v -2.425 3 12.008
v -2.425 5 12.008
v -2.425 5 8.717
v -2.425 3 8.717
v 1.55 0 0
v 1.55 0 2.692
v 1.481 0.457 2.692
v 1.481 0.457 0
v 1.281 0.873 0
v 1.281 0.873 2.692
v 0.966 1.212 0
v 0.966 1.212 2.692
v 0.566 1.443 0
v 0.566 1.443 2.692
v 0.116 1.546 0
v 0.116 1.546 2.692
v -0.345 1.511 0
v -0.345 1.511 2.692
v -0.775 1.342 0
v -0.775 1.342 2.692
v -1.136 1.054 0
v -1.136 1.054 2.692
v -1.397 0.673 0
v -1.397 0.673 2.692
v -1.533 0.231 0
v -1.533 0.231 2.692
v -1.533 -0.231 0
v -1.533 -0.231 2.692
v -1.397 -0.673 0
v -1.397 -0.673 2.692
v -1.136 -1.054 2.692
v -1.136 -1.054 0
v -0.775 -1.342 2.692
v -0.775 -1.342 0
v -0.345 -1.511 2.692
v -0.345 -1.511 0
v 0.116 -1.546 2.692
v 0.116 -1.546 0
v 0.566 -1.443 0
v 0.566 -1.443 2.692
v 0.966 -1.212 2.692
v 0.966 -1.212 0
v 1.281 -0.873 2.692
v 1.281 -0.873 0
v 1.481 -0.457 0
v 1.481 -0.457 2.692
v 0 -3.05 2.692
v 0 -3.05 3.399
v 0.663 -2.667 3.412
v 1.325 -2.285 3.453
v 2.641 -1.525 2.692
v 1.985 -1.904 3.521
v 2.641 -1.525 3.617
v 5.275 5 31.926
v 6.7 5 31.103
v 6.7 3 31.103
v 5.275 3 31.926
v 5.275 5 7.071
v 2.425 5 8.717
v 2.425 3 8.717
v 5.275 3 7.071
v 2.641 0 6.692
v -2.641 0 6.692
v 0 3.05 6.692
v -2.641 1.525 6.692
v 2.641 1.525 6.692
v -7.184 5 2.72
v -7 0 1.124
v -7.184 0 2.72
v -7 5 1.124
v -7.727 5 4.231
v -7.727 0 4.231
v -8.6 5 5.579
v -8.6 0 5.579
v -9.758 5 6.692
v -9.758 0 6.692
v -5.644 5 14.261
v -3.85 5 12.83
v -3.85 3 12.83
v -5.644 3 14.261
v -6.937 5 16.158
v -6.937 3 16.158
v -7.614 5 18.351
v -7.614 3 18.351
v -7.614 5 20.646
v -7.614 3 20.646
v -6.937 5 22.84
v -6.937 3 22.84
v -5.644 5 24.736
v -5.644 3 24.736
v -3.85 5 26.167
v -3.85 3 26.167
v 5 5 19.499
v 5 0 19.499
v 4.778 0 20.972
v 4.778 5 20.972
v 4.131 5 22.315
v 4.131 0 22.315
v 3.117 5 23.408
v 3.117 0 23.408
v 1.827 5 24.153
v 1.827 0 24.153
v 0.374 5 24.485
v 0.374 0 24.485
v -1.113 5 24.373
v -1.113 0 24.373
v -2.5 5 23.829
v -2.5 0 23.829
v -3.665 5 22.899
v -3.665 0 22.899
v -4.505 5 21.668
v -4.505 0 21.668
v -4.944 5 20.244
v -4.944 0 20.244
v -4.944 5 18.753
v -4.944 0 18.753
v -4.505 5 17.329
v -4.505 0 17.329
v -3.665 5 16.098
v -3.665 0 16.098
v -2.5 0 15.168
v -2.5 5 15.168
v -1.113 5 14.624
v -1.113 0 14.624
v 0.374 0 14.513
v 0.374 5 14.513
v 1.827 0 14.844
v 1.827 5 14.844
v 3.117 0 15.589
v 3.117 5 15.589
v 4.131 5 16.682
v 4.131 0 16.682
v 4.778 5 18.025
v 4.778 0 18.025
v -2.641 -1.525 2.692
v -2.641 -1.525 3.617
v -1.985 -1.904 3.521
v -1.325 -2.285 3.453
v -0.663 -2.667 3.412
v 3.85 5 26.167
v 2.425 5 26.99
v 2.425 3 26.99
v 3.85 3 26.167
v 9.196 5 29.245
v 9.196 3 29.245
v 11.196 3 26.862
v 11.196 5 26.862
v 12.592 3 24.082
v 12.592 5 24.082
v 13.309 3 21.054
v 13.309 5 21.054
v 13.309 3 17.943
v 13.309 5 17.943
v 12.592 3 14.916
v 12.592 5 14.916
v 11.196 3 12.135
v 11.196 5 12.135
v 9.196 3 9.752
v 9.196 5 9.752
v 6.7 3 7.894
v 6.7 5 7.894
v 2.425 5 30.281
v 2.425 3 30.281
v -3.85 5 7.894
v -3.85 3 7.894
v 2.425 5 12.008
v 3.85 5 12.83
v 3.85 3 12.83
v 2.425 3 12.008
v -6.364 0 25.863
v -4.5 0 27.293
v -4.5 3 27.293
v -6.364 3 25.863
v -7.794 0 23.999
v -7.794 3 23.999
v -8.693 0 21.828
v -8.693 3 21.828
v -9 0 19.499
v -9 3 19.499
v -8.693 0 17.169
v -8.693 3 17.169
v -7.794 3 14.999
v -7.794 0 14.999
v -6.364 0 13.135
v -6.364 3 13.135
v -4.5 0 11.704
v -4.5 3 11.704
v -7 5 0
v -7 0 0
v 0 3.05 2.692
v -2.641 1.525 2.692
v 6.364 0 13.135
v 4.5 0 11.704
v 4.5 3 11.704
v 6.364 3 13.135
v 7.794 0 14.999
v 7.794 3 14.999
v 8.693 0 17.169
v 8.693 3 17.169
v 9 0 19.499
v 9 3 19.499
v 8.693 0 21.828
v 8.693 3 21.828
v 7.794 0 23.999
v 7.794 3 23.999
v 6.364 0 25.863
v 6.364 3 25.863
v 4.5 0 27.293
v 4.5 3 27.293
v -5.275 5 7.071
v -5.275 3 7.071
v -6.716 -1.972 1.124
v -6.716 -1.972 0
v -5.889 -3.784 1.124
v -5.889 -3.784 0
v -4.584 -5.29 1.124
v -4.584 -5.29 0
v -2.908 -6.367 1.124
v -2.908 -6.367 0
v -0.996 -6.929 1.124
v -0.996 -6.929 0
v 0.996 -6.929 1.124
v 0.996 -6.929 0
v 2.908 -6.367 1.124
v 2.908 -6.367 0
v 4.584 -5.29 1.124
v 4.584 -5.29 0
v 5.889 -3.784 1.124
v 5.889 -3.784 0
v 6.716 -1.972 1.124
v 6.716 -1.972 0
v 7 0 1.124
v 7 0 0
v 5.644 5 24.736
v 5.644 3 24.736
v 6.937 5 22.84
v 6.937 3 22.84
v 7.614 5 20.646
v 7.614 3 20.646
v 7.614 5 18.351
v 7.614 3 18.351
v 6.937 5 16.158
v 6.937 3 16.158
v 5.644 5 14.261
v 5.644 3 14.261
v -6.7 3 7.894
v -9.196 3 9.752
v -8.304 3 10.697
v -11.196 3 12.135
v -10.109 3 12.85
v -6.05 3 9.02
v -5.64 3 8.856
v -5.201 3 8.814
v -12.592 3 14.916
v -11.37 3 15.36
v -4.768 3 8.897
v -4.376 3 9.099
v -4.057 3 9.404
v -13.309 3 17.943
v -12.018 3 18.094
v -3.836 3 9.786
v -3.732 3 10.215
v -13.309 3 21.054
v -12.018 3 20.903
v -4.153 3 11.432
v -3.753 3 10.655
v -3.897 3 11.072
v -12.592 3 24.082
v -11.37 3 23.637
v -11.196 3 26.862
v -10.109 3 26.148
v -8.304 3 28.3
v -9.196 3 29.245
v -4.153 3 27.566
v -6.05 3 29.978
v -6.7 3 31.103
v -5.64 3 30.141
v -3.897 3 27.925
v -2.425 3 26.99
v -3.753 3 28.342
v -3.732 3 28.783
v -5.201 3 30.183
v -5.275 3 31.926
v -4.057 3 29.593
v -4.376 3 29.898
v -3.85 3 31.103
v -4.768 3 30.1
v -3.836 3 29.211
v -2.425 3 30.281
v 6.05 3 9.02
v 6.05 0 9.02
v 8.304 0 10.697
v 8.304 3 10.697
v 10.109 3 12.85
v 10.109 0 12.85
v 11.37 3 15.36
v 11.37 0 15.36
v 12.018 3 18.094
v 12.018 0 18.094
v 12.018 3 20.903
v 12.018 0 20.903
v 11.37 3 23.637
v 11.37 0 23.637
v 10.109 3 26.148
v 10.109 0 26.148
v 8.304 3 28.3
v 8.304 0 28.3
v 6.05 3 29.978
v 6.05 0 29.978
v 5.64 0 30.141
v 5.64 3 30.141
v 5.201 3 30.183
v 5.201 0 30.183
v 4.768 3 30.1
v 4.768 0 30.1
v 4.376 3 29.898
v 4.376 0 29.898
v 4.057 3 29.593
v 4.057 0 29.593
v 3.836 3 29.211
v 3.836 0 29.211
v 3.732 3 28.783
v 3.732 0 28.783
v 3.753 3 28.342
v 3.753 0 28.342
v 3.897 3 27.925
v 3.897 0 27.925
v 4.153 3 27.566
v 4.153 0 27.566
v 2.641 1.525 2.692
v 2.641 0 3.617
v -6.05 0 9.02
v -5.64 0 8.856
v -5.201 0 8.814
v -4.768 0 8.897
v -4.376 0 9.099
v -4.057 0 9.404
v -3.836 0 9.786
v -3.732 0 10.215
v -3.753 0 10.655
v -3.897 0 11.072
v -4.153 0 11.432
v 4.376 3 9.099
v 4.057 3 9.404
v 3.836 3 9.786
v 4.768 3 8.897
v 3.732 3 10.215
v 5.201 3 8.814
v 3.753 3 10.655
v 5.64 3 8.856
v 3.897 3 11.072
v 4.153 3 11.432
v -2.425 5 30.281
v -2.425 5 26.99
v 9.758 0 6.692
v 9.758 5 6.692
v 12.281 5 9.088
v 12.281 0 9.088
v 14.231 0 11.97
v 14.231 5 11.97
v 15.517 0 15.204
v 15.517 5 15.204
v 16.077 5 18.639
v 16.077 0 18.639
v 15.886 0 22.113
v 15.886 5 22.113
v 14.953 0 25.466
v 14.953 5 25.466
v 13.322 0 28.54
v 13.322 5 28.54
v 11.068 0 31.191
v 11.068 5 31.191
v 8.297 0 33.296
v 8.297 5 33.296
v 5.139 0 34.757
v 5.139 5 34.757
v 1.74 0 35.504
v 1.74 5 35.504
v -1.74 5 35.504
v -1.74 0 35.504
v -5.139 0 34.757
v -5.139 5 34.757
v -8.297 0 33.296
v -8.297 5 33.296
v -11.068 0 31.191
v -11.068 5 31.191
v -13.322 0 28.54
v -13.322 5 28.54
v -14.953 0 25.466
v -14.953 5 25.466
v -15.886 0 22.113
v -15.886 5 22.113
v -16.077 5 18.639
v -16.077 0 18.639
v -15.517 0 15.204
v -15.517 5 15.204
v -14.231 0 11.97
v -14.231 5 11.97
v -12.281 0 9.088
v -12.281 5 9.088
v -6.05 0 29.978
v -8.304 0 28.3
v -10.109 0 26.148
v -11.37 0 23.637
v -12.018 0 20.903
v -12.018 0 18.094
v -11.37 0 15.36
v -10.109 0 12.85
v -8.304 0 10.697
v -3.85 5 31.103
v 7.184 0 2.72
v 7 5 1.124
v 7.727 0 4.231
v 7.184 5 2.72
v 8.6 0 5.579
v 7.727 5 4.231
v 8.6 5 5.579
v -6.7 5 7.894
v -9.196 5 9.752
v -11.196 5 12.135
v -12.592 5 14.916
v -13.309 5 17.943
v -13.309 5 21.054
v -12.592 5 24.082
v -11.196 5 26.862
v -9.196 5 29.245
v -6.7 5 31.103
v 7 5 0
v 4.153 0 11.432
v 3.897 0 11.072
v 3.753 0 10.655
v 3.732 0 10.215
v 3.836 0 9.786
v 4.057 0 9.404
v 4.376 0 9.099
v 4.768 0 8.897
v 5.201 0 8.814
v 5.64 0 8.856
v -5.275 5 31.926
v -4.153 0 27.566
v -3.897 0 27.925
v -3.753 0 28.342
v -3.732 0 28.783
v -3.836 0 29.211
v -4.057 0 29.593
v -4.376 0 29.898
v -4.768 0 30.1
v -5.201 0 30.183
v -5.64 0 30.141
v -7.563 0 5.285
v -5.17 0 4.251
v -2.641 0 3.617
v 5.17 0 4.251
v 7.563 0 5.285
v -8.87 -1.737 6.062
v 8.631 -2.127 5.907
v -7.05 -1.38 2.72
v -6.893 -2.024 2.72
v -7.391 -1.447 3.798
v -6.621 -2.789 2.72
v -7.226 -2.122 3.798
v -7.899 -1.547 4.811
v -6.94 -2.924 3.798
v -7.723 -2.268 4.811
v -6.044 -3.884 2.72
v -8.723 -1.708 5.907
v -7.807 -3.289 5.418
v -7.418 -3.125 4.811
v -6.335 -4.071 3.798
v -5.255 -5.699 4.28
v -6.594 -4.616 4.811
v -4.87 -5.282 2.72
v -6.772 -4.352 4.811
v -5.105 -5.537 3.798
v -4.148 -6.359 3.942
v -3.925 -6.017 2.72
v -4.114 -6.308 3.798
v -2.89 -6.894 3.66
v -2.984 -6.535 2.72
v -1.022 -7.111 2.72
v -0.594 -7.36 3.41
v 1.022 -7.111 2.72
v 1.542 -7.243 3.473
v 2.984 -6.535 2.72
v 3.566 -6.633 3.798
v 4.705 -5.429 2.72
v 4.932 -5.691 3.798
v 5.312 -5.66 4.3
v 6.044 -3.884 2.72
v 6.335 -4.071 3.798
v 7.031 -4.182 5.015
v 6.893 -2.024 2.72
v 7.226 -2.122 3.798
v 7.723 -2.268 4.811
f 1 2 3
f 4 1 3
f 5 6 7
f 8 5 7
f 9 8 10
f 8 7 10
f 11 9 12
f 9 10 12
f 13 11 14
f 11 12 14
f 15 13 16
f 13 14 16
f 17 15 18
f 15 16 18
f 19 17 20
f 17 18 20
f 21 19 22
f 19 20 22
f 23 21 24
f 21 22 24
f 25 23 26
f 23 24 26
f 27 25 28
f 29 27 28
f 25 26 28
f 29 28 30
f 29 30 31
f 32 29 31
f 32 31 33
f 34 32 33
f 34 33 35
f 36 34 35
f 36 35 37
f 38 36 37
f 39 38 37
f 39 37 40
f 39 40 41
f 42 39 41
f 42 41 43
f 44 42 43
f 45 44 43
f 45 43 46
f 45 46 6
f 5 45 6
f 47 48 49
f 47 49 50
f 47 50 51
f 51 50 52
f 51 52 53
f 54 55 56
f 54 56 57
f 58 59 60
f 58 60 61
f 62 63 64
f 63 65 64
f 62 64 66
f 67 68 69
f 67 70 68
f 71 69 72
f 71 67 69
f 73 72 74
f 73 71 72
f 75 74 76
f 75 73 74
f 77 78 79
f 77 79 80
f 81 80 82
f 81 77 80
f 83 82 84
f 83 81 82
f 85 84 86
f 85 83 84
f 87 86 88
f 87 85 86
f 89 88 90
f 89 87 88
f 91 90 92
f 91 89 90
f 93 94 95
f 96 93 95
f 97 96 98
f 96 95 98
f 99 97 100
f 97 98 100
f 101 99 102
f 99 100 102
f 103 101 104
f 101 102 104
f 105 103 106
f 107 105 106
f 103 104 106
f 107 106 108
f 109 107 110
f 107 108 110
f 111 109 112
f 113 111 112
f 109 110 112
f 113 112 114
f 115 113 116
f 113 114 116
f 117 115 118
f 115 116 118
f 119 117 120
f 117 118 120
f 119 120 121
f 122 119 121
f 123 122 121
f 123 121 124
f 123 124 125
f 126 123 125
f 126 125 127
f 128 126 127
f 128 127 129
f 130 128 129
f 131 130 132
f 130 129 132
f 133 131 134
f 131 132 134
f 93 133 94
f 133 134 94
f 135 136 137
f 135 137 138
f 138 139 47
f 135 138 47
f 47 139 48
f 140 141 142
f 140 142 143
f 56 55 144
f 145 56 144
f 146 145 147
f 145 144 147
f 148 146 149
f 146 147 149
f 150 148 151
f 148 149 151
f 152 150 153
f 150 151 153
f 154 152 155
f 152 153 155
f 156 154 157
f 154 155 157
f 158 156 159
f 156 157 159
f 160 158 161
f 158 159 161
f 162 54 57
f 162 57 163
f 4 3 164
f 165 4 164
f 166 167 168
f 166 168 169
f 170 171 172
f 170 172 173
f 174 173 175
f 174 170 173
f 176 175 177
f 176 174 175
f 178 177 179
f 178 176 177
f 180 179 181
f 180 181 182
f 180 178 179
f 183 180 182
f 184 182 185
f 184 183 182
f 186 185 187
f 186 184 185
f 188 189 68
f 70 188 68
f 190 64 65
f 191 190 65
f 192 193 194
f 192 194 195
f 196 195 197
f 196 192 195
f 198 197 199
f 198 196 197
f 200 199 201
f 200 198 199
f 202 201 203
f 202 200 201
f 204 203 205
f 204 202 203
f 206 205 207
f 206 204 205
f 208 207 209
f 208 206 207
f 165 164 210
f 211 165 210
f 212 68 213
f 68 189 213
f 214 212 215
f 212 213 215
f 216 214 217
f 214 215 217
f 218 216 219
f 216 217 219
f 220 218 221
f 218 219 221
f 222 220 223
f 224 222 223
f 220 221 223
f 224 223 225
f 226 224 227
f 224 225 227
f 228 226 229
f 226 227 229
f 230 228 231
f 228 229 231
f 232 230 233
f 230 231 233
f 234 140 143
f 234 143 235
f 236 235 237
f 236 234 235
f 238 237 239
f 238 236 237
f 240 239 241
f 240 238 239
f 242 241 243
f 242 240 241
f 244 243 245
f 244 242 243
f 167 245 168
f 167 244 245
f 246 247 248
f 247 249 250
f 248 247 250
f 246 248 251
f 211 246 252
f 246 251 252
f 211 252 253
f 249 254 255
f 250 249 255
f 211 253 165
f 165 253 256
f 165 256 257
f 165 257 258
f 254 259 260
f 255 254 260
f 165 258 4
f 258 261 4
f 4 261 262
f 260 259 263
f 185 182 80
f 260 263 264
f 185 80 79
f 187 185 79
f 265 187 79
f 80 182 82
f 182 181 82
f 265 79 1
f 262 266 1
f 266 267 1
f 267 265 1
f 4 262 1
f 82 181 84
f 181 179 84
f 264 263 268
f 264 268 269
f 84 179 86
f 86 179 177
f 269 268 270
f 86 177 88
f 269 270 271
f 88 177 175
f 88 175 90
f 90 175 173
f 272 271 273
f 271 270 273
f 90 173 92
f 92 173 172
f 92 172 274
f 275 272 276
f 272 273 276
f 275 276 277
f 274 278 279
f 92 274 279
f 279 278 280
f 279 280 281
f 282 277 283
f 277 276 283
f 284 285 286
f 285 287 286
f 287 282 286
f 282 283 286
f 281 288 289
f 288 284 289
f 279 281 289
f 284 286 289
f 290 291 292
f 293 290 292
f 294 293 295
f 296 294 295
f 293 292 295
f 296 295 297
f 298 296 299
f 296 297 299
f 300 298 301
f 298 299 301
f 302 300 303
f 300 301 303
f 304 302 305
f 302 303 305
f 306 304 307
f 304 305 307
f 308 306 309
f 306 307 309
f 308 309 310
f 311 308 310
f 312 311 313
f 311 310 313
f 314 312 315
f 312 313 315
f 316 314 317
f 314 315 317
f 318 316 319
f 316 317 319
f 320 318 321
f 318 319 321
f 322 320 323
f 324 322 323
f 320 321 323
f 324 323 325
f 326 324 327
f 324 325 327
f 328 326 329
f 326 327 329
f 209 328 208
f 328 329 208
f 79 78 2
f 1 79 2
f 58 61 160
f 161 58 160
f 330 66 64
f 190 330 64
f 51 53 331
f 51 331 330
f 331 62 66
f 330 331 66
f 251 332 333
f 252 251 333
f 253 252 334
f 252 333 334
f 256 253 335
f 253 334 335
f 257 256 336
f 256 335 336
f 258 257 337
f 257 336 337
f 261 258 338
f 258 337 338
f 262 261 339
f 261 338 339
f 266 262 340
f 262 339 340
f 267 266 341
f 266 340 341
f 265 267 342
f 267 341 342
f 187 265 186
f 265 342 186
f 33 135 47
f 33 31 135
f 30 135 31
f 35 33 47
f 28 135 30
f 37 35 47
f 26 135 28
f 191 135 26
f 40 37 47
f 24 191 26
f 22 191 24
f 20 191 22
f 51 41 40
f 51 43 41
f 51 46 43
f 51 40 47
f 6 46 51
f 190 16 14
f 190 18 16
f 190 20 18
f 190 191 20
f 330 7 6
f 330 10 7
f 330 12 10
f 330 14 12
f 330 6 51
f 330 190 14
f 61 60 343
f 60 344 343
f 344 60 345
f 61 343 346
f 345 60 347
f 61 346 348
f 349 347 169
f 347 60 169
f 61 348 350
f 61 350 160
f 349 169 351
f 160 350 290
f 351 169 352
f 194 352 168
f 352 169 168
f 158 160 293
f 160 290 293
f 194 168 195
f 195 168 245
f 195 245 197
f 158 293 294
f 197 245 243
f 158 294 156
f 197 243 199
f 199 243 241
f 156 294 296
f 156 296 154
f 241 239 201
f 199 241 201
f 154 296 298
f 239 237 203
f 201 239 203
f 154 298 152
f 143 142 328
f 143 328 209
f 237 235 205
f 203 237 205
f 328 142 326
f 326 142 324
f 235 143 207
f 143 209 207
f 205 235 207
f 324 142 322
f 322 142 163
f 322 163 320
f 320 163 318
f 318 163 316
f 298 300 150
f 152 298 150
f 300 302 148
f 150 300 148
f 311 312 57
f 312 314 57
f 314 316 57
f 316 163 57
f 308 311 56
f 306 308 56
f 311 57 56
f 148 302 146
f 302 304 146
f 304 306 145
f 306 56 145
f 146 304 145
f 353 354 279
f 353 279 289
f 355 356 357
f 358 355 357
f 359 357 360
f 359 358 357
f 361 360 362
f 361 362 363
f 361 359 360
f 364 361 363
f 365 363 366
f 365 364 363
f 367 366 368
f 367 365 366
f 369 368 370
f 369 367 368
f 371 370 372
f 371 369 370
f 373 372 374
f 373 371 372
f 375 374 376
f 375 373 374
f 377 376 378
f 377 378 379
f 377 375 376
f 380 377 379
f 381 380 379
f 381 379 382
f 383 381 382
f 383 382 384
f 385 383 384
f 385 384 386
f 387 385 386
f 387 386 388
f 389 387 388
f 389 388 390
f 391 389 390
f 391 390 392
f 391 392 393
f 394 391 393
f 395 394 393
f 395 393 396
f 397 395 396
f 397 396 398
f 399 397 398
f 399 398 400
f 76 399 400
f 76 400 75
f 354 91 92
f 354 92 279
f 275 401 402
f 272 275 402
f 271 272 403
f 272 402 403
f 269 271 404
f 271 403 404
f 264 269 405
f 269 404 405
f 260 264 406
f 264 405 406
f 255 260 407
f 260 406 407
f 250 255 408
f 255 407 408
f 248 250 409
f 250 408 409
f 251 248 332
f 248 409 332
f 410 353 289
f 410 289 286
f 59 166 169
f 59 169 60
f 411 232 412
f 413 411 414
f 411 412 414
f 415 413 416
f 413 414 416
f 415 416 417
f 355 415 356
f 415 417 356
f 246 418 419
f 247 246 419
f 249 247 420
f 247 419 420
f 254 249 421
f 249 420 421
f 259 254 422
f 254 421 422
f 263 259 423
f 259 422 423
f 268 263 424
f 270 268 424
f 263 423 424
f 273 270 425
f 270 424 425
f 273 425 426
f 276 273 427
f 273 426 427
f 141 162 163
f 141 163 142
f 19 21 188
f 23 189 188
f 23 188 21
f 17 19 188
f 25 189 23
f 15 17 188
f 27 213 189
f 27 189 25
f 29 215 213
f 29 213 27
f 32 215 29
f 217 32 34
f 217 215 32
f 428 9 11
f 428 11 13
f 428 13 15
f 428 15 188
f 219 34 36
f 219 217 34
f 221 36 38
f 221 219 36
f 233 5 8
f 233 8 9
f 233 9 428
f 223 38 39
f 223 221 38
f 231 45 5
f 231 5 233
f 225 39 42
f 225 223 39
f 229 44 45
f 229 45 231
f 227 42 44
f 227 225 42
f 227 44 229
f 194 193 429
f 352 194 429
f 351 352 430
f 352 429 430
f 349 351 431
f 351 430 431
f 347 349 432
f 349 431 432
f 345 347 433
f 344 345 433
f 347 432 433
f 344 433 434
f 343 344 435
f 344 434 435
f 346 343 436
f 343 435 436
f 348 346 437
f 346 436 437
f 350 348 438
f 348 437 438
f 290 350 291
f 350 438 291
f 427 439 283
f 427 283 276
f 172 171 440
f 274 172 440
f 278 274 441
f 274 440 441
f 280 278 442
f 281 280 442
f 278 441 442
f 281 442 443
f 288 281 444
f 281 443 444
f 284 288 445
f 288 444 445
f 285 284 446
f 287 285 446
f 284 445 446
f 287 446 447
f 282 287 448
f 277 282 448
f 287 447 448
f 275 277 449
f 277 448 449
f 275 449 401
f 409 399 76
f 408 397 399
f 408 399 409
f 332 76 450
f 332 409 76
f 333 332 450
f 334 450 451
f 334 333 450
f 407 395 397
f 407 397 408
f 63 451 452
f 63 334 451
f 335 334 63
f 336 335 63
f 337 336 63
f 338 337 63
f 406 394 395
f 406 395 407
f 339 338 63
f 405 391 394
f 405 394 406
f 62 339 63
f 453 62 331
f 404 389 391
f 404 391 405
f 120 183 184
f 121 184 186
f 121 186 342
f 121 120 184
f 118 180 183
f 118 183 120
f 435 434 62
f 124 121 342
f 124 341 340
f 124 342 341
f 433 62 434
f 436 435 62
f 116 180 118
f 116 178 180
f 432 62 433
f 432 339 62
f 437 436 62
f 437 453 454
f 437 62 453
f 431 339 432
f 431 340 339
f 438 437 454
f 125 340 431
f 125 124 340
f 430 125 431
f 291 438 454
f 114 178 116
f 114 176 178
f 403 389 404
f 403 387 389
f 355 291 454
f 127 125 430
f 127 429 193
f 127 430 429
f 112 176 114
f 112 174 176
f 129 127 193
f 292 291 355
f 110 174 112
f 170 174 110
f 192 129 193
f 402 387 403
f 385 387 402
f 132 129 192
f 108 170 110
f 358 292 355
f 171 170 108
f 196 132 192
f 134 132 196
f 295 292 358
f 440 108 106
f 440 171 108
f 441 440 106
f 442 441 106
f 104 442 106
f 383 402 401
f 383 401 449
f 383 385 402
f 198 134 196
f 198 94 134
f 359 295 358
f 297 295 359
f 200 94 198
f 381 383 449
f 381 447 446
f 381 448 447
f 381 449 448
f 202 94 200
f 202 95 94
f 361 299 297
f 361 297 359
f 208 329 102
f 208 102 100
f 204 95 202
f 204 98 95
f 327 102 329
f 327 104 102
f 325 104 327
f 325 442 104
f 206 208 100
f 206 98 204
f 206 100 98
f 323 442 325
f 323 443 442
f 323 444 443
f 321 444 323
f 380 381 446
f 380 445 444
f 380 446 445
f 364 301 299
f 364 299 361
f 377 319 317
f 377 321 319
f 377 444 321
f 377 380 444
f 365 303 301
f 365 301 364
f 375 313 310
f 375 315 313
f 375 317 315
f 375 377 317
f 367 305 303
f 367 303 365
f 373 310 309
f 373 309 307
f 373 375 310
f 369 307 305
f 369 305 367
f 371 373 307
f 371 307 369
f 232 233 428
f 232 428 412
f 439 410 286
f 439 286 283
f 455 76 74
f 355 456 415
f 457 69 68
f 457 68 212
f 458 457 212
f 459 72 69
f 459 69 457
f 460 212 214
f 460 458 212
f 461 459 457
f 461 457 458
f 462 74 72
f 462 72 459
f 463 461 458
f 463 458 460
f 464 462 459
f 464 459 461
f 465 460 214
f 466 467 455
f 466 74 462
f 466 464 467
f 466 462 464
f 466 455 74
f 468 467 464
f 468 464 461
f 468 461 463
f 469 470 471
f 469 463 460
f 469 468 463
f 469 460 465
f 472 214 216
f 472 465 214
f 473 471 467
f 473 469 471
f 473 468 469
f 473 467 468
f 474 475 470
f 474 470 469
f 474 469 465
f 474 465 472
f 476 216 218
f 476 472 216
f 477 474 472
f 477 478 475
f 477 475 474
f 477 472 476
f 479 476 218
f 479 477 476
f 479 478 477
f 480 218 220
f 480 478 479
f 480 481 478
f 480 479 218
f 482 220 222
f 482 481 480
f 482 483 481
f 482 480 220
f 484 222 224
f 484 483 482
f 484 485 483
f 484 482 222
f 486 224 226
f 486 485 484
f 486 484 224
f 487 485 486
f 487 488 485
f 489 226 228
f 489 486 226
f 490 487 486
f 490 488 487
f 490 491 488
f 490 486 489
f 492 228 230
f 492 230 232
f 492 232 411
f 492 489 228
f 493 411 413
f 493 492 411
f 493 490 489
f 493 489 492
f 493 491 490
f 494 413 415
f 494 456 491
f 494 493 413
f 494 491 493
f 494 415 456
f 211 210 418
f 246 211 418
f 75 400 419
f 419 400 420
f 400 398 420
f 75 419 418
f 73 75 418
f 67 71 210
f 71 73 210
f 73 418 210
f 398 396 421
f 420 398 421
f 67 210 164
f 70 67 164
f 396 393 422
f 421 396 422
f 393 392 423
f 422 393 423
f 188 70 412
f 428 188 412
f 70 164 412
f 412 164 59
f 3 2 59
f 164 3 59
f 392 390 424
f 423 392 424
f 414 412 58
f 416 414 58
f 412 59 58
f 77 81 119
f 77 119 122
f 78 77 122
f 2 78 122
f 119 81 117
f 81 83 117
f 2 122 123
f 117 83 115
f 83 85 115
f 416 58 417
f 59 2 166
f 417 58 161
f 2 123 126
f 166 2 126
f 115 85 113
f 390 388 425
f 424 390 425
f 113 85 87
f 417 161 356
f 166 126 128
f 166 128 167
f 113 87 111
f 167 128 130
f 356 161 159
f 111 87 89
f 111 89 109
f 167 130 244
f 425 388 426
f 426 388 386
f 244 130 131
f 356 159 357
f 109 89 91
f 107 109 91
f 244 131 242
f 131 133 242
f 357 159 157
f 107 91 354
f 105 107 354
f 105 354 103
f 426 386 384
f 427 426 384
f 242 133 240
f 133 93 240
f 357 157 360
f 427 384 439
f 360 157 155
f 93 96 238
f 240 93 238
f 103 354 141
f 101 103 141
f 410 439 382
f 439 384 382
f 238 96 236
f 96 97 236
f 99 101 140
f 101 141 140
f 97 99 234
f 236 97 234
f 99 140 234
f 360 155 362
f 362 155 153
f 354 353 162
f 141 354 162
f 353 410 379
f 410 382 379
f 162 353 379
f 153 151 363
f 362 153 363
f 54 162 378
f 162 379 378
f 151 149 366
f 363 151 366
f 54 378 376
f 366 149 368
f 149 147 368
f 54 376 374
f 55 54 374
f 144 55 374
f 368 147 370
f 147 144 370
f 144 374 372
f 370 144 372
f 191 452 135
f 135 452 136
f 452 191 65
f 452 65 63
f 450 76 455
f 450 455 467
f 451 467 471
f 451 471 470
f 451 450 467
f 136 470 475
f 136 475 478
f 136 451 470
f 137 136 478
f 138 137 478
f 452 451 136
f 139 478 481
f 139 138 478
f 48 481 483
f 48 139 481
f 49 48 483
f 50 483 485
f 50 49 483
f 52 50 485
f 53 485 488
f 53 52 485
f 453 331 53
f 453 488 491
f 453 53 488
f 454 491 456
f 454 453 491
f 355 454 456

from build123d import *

# Parameters (mm, degrees)
SKETCH001_AS_DRAWN_R                 = 5
EXTRUDE001_DEPTH                     = 5
EXTRUDE001_ONTO_SKETCH001_ROLL_ANGLE = 90
FILLET_R                             = 7
POCKET_DEPTH                         = 2
REVOLVE_ANGLE                        = 180
REVOLVE_ONTO_SKETCH003_ROLL_ANGLE    = 90
POCKET001_DEPTH                      = 4
SKETCH005_R                          = 1.55
POCKET002_DEPTH                      = 2.693383
POCKET003_DEPTH                      = 9.758576


with BuildPart() as pocket:
    # Sketch001 as drawn → Extrude001 (new)
    with BuildSketch(Plane.XY):
        with BuildLine():
            Line((-7, 0), (7, 0))
            Line((7, 0), (7, 5))
            ThreePointArc((7, 5), (0, 35.598621), (-7, 5))
            Line((-7, 0), (-7, 5))
        make_face()
        with Locations((0, 19.498621)):
            Circle(SKETCH001_AS_DRAWN_R, mode=Mode.SUBTRACT)
        with BuildLine():
            ThreePointArc((-6.05, 29.977528), (-12.1, 19.498621), (-6.05, 9.019713))
            ThreePointArc((-6.05, 9.019713), (-3.932661, 9.587053), (-4.5, 11.704392))
            ThreePointArc((-4.5, 27.292849), (-9, 19.498621), (-4.5, 11.704392))
            ThreePointArc((-4.5, 27.292849), (-3.932661, 29.410189), (-6.05, 29.977528))
        make_face(mode=Mode.SUBTRACT)
        with BuildLine():
            ThreePointArc((4.5, 11.704392), (9, 19.498621), (4.5, 27.292849))
            ThreePointArc((6.05, 29.977528), (3.932661, 29.410189), (4.5, 27.292849))
            ThreePointArc((6.05, 9.019713), (12.1, 19.498621), (6.05, 29.977528))
            ThreePointArc((4.5, 11.704392), (3.932661, 9.587053), (6.05, 9.019713))
        make_face(mode=Mode.SUBTRACT)
    extrude(amount=-EXTRUDE001_DEPTH)


with BuildPart() as pocket_1:
    # Extrude001 onto Sketch001 roll: moved
    add(pocket.part.rotate(Axis((0, 0, 0), (1, 0, 0)), EXTRUDE001_ONTO_SKETCH001_ROLL_ANGLE))


with BuildPart() as pocket_2:
    # Extrude001 onto Sketch001 placement: moved
    add(pocket_1.part)

    # Fillet
    fillet_edges = [pocket_2.edges().sort_by_distance(p)[0] for p in [
        (7, 2.5, 5),
        (-7, 2.5, 5),
    ]]
    fillet(fillet_edges, radius=FILLET_R)

    # Sketch002 → Pocket (cut)
    with BuildSketch(Plane(origin=(0, 5, 0), x_dir=(-1, 0, 0), z_dir=(0, 1, 0))):
        with BuildLine():
            ThreePointArc((-3.85, 26.167016), (-7.7, 19.498621), (-3.85, 12.830225))
            Line((-3.85, 12.830225), (-2.425, 12.007501))
            Line((-2.425, 12.007501), (-2.425, 10.362053))
            Line((-2.425, 10.362053), (-2.425, 8.716604))
            Line((-2.425, 8.716604), (-3.85, 7.89388))
            Line((-3.85, 7.89388), (-5.275, 7.071156))
            Line((-5.275, 7.071156), (-6.7, 7.89388))
            ThreePointArc((-6.7, 31.103361), (-13.4, 19.498621), (-6.7, 7.89388))
            Line((-6.7, 31.103361), (-5.275, 31.926085))
            Line((-5.275, 31.926085), (-3.85, 31.103361))
            Line((-3.85, 31.103361), (-2.425, 30.280637))
            Line((-2.425, 30.280637), (-2.425, 28.635189))
            Line((-2.425, 28.635189), (-2.425, 26.98974))
            Line((-2.425, 26.98974), (-3.85, 26.167016))
        make_face()
        with BuildLine():
            ThreePointArc((3.85, 12.830225), (7.7, 19.498621), (3.85, 26.167016))
            Line((3.85, 26.167016), (2.424998, 26.989738))
            Line((2.424998, 26.989738), (2.425, 28.635187))
            Line((2.425, 28.635187), (2.425002, 30.280636))
            Line((2.425002, 30.280636), (3.850002, 31.103362))
            Line((3.850002, 31.103362), (5.275001, 31.926088))
            Line((5.275001, 31.926088), (6.7, 31.103361))
            ThreePointArc((6.7, 7.89388), (13.4, 19.498621), (6.7, 31.103361))
            Line((5.275, 7.071157), (6.7, 7.89388))
            Line((3.85, 7.89388), (5.275, 7.071157))
            Line((2.425, 8.716604), (3.85, 7.89388))
            Line((2.425, 10.362052), (2.425, 8.716604))
            Line((2.425, 12.0075), (2.425, 10.362052))
            Line((3.85, 12.830225), (2.425, 12.0075))
        make_face()
    extrude(amount=-POCKET_DEPTH, mode=Mode.SUBTRACT)


with BuildPart() as pocket003:
    # Sketch003 as drawn → Revolve (revolve)
    with BuildSketch(Plane.XY):
        with BuildLine():
            ThreePointArc((-7, 1.124454), (-7.727163, 4.231143), (-9.757576, 6.692383))
            Line((0, 6.692383), (-9.757576, 6.692383))
            Line((0, 0), (0, 6.692383))
            Line((-7, 0), (0, 0))
            Line((-7, 1.124454), (-7, 0))
        make_face()
    revolve(axis=Axis((0, 0, 0), (0, 1, 0)), revolution_arc=REVOLVE_ANGLE)


with BuildPart() as pocket003_1:
    # Revolve onto Sketch003 roll: moved
    add(pocket003.part.rotate(Axis((0, 0, 0), (1, 0, 0)), REVOLVE_ONTO_SKETCH003_ROLL_ANGLE))


with BuildPart() as pocket003_2:
    # Revolve onto Sketch003 placement: moved
    add(pocket003_1.part)

    # Fusion: union Pocket
    add(pocket_2.part)

    # Sketch004 → Pocket001 (cut)
    with BuildSketch(Plane.XY.offset(6.692383)):
        Polygon((2.641377, -1.525), (2.641377, 1.525), (0, 3.05), (-2.641377, 1.525), (-2.641377, -1.525), (0, -3.05), align=None)
    extrude(amount=-POCKET001_DEPTH, mode=Mode.SUBTRACT)

    # Sketch005 → Pocket002 (cut, through all)
    with BuildSketch(Plane.XY.offset(2.692383)):
        Circle(SKETCH005_R)
    extrude(amount=-POCKET002_DEPTH, mode=Mode.SUBTRACT)

    # Sketch006 → Pocket003 (cut, through all)
    with BuildSketch(Plane.XZ):
        with BuildLine():
            Line((-9.757576, 6.692383), (9.757576, 6.692383))
            ThreePointArc((-9.757576, 6.692383), (0, 3.398621), (9.757576, 6.692383))
        make_face()
    extrude(amount=POCKET003_DEPTH, mode=Mode.SUBTRACT)


solid = pocket003_2.part
